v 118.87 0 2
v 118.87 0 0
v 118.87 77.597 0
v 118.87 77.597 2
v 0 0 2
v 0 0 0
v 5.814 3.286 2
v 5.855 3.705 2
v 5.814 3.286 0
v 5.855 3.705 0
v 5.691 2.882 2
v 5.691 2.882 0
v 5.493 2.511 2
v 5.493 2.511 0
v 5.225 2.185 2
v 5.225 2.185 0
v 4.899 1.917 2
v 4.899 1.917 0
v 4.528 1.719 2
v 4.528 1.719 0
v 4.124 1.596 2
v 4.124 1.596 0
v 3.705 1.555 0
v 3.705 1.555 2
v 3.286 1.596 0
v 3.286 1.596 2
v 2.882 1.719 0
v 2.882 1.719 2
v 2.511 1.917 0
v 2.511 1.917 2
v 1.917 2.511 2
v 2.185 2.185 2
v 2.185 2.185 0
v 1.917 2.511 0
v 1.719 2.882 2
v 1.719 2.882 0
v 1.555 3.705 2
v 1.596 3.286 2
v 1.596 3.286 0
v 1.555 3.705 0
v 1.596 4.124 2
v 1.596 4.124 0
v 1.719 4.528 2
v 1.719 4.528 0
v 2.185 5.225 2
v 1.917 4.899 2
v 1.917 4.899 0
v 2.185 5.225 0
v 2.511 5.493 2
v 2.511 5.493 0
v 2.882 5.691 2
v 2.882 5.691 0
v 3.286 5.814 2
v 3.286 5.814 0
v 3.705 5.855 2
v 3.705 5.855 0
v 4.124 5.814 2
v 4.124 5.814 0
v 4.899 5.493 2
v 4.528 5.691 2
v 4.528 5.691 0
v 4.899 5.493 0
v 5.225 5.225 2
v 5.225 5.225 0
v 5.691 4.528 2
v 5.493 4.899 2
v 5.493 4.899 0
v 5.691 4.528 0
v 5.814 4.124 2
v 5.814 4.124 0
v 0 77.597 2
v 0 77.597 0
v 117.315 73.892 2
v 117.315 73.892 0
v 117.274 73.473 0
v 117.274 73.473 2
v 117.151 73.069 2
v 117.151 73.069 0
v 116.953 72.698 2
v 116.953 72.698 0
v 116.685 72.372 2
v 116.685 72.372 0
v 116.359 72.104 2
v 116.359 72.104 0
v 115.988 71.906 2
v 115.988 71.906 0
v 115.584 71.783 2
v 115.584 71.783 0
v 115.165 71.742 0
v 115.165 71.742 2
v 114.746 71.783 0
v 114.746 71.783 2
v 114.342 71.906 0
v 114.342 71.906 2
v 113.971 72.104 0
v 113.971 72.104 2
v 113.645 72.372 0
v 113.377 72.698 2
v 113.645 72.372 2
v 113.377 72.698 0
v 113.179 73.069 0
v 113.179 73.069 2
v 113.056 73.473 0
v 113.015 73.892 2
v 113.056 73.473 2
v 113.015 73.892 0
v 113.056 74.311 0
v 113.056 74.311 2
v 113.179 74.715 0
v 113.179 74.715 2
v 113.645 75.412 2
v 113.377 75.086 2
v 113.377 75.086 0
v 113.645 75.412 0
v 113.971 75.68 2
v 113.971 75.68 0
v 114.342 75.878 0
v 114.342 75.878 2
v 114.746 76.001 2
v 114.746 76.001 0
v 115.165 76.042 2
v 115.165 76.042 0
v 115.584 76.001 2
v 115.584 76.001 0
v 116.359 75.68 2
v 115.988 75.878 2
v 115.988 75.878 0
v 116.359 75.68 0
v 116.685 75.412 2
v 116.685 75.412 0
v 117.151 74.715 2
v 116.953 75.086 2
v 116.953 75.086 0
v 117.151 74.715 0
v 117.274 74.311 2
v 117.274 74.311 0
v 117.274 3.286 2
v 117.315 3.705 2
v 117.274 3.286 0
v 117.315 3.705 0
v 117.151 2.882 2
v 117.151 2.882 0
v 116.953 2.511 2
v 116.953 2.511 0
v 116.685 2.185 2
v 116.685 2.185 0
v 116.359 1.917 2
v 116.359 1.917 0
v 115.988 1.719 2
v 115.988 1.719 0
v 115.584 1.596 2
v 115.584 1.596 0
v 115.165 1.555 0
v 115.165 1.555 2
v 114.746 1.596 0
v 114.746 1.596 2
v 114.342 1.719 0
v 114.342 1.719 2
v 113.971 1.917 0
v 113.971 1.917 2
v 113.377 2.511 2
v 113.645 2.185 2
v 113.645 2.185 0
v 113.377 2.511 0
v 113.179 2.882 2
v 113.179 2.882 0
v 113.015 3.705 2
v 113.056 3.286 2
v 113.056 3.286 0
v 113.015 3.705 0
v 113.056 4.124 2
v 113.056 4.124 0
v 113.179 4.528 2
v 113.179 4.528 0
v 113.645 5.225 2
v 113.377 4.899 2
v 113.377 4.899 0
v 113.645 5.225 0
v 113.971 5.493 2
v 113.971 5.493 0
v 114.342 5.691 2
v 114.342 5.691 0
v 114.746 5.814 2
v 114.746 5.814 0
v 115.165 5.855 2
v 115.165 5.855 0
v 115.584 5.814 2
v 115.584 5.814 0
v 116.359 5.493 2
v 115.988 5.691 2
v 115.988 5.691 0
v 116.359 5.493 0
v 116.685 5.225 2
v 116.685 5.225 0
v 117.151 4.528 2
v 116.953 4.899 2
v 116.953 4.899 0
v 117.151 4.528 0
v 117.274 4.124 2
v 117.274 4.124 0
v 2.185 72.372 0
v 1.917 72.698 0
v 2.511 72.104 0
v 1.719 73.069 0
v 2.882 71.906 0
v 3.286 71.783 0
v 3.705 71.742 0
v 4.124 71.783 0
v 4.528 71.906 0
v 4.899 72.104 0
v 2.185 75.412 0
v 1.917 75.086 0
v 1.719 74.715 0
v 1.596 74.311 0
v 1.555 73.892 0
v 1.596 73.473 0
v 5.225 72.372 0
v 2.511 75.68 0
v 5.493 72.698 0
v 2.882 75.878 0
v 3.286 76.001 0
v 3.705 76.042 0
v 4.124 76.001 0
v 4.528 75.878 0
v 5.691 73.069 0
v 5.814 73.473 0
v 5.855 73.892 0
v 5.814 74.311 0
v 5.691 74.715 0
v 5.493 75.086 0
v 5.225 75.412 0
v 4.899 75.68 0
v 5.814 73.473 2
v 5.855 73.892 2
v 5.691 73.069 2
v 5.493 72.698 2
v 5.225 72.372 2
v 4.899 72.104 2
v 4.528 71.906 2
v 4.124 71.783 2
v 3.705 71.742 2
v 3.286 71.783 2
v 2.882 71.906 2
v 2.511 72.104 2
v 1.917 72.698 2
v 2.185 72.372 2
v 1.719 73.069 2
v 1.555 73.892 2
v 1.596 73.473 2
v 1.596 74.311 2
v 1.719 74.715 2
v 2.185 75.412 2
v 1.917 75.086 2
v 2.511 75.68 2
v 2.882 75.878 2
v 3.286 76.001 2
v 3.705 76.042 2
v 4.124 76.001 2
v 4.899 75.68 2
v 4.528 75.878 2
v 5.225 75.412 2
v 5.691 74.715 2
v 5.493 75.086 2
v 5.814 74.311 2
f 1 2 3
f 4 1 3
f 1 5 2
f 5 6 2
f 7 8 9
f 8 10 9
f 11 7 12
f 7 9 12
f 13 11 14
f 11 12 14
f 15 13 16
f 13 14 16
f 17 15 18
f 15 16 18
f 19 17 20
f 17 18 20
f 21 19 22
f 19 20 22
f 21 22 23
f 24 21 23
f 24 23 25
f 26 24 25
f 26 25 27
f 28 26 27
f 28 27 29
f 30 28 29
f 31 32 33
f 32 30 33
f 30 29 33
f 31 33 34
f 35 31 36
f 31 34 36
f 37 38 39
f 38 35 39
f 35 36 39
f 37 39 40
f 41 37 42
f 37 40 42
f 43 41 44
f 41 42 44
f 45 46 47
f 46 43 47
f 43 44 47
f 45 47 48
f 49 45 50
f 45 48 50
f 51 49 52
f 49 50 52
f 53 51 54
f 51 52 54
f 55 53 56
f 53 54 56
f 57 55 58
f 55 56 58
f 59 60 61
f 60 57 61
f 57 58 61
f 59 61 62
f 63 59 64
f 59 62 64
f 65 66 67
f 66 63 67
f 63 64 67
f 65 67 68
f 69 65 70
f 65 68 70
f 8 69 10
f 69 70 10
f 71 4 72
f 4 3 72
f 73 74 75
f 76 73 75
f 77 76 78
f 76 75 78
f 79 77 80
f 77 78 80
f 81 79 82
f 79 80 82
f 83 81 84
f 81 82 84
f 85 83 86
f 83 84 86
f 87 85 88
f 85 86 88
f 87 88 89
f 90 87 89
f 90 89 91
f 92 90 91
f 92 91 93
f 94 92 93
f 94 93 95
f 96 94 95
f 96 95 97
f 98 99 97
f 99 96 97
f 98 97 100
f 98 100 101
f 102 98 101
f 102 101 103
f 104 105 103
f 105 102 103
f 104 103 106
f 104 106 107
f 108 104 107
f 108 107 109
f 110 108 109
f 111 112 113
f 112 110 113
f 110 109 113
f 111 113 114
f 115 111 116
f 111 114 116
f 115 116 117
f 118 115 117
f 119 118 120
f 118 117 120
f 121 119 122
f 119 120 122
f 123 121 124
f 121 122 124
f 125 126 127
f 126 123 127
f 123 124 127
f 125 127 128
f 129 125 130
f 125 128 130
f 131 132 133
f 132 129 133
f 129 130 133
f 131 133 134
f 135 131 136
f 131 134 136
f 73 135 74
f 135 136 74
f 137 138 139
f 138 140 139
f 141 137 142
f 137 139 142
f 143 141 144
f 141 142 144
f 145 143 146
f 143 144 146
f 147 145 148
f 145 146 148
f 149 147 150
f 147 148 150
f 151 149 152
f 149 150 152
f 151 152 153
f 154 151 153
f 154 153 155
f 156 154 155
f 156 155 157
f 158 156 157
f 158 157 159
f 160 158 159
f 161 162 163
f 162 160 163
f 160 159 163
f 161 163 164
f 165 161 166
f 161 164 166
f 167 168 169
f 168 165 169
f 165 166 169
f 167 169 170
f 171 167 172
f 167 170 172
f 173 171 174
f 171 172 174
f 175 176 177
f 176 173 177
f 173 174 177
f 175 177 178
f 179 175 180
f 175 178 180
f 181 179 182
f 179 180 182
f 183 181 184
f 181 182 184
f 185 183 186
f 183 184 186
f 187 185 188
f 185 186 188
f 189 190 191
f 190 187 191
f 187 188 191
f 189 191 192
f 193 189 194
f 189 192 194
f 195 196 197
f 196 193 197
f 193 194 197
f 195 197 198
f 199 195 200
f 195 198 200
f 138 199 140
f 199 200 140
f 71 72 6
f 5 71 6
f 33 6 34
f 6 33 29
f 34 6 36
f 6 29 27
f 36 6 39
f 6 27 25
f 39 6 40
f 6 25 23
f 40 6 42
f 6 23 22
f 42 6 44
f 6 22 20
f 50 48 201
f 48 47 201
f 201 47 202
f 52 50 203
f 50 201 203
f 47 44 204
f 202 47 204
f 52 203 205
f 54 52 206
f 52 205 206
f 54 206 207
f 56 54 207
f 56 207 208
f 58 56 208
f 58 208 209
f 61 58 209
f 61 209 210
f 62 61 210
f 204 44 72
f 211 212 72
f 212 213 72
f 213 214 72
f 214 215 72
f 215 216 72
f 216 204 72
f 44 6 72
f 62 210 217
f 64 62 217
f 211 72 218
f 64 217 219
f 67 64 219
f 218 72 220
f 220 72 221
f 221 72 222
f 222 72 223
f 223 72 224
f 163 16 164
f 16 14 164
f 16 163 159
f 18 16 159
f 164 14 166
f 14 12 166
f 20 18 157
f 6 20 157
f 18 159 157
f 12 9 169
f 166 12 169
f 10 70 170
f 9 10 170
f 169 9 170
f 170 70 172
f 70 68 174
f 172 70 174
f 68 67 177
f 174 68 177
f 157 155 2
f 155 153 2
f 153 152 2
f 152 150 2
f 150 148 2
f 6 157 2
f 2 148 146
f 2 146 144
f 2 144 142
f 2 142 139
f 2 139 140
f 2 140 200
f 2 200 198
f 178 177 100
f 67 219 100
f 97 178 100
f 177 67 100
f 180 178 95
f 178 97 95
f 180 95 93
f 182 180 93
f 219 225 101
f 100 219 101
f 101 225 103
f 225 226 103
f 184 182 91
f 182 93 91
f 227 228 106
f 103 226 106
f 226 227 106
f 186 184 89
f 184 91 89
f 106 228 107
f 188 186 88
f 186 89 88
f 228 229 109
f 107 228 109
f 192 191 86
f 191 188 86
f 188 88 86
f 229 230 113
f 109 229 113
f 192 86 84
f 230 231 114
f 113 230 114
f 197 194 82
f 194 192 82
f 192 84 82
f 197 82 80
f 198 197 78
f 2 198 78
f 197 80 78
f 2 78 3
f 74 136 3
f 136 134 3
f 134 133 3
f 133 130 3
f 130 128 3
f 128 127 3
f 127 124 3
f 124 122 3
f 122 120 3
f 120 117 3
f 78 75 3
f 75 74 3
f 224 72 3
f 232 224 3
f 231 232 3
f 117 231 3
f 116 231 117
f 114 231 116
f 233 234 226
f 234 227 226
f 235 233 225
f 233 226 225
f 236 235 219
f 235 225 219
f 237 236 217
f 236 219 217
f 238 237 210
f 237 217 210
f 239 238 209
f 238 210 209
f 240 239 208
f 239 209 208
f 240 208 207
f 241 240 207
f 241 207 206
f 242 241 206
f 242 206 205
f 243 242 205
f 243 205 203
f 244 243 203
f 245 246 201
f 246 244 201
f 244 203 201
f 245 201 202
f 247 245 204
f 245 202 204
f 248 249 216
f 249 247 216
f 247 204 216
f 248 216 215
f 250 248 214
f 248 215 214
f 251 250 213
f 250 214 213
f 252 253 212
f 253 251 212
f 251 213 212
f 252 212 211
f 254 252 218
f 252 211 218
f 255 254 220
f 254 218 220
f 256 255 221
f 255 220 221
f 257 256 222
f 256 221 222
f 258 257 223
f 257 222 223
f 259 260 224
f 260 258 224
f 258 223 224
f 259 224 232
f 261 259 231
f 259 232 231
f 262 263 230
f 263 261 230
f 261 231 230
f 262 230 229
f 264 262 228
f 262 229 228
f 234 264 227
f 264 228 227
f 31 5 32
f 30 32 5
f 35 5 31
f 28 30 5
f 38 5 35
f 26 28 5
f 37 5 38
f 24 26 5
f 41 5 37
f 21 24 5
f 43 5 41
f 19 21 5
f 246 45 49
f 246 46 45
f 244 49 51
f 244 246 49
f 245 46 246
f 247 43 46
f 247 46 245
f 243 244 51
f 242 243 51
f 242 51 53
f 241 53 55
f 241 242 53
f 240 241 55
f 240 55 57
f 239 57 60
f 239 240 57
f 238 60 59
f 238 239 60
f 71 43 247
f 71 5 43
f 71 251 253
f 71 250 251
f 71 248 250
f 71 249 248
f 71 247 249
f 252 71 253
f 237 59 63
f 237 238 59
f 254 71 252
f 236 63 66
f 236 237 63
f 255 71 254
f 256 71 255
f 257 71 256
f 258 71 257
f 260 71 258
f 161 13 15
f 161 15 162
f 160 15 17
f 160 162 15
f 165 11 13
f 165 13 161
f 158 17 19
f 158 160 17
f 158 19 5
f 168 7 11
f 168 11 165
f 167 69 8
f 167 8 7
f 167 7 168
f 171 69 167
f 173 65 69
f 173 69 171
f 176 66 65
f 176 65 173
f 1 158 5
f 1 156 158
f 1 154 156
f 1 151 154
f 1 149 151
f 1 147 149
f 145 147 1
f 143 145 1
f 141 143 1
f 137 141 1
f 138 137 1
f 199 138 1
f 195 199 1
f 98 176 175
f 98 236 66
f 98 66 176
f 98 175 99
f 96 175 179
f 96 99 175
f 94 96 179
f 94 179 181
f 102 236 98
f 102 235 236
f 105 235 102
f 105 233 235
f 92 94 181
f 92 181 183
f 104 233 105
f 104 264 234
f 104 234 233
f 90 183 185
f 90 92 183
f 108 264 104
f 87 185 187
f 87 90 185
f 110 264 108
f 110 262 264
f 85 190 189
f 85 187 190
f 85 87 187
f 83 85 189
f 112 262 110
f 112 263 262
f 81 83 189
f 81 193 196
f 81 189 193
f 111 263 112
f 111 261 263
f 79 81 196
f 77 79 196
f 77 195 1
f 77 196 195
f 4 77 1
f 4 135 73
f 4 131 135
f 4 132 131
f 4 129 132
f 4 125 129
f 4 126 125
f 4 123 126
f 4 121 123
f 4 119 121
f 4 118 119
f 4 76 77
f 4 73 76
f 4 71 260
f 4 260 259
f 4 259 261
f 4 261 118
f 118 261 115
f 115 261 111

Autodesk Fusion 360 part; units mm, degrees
sketch "Sketch1" plane through (0, 0, 0) normal (0, 0, 1) x (1, 0, 0)
  line L0 (0, 0) -> (118.87, 0)
  line L1 (118.87, 0) -> (118.87, 77.597)
  line L2 (118.87, 77.597) -> (0, 77.597)
  line L3 (0, 77.597) -> (0, 0)
  circle A0 centre (3.705, 73.892) radius 3.705
  circle A1 centre (3.705, 73.892) radius 2.15
  circle A2 centre (115.165, 73.892) radius 2.15
  circle A3 centre (115.165, 73.892) radius 3.705
  circle A4 centre (115.165, 3.705) radius 3.705
  circle A5 centre (115.165, 3.705) radius 2.15
  circle A6 centre (3.705, 3.705) radius 3.705
  circle A7 centre (3.705, 3.705) radius 2.15
  dimension "d1" = 118.87
  dimension "d2" = 77.597
  dimension "d21" = 3.705
  dimension "d22" = 4.3
extrude "Extrude3" add sketch "Sketch1" along normal blind 2
